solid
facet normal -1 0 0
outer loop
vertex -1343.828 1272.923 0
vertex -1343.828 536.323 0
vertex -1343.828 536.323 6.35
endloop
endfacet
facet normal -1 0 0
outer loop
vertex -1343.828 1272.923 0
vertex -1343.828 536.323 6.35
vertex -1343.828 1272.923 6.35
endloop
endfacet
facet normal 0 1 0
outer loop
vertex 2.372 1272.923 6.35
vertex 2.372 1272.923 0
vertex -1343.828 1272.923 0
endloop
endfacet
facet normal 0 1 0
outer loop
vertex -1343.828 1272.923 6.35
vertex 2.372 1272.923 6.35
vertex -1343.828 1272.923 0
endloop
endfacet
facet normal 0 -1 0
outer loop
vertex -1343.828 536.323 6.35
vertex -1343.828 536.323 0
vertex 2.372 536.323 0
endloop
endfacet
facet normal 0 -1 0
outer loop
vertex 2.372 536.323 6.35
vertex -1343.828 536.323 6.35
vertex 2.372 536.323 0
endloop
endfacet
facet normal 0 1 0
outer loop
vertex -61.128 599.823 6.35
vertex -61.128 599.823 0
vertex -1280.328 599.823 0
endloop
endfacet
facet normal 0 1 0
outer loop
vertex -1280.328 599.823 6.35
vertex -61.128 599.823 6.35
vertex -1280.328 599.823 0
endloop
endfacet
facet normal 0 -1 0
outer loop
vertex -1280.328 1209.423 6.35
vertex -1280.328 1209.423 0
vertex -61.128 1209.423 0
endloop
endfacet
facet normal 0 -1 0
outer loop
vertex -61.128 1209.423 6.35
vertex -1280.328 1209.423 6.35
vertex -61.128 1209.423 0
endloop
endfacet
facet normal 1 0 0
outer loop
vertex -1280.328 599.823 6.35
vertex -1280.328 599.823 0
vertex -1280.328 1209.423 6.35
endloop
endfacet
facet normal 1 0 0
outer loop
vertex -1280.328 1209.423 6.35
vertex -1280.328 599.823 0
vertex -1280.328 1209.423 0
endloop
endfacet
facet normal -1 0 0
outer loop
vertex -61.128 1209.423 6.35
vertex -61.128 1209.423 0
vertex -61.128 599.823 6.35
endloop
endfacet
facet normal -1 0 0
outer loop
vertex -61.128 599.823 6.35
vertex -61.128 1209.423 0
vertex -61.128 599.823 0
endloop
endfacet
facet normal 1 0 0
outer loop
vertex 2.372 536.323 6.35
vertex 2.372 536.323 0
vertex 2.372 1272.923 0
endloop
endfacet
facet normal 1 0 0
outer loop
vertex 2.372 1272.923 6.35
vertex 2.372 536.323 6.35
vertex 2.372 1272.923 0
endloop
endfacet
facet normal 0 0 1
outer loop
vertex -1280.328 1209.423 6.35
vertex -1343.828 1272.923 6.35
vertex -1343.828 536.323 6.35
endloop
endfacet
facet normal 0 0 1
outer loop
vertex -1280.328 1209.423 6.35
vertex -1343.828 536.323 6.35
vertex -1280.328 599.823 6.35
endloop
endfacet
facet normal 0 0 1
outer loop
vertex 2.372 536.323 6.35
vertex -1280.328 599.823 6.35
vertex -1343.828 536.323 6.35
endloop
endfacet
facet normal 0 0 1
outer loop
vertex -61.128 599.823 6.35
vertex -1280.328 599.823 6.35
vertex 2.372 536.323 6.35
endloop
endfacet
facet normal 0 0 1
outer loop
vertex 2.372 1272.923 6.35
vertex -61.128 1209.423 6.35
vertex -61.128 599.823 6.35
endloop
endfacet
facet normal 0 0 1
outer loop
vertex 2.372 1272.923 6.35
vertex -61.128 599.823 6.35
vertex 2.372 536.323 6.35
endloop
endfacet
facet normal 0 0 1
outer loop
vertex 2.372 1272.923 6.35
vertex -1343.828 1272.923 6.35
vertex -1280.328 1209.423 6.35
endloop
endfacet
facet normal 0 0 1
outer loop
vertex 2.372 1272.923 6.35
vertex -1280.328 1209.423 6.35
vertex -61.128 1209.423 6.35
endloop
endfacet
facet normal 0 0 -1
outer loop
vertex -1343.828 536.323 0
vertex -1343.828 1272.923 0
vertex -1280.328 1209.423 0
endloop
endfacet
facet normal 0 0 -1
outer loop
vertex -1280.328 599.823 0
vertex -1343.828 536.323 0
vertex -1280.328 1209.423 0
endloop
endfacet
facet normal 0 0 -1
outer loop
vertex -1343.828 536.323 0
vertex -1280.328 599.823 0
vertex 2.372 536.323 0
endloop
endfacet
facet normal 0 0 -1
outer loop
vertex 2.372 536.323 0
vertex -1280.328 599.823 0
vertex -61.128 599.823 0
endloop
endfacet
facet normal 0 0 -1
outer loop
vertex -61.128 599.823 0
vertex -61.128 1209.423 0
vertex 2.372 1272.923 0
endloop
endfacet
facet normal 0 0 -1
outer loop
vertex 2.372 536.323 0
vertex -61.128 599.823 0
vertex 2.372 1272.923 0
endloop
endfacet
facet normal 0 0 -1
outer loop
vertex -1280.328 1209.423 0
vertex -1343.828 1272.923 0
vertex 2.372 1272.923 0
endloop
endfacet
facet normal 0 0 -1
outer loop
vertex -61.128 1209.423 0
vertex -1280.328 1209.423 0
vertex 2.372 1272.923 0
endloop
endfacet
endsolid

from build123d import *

# Parameters (mm, degrees)
F0_W     = 63.5
F0_H     = 63.5
F0_W_2   = 1219.2
F1_DEPTH = 6.35
F0_H_2   = 609.6
F2_DEPTH = 6.35


with BuildPart() as f1:
    # F0 (on Top) → F1 (new body)
    with BuildSketch(Plane.XY):
        with Locations((-1312.078089, 1241.172938)):
            Rectangle(F0_W, F0_H)
        with Locations((-1312.078089, 568.072938)):
            Rectangle(F0_W, F0_H)
        with Locations((-670.728089, 1241.172938)):
            Rectangle(F0_W_2, F0_H)
        with Locations((-670.728089, 568.072938)):
            Rectangle(F0_W_2, F0_H)
        Polygon((-61.128089, 1272.922938), (-61.128089, 1209.422938), (-61.128089, 599.822938), (-61.128089, 536.322938), (2.371911, 536.322938), (2.371911, 1272.922938), align=None)
    extrude(amount=F1_DEPTH)

    # F0 (on Top) → F2 (join)
    with BuildSketch(Plane.XY):
        with Locations((-1312.078089, 904.622938)):
            Rectangle(F0_W, F0_H_2)
    extrude(amount=F2_DEPTH)


solid = f1.part
